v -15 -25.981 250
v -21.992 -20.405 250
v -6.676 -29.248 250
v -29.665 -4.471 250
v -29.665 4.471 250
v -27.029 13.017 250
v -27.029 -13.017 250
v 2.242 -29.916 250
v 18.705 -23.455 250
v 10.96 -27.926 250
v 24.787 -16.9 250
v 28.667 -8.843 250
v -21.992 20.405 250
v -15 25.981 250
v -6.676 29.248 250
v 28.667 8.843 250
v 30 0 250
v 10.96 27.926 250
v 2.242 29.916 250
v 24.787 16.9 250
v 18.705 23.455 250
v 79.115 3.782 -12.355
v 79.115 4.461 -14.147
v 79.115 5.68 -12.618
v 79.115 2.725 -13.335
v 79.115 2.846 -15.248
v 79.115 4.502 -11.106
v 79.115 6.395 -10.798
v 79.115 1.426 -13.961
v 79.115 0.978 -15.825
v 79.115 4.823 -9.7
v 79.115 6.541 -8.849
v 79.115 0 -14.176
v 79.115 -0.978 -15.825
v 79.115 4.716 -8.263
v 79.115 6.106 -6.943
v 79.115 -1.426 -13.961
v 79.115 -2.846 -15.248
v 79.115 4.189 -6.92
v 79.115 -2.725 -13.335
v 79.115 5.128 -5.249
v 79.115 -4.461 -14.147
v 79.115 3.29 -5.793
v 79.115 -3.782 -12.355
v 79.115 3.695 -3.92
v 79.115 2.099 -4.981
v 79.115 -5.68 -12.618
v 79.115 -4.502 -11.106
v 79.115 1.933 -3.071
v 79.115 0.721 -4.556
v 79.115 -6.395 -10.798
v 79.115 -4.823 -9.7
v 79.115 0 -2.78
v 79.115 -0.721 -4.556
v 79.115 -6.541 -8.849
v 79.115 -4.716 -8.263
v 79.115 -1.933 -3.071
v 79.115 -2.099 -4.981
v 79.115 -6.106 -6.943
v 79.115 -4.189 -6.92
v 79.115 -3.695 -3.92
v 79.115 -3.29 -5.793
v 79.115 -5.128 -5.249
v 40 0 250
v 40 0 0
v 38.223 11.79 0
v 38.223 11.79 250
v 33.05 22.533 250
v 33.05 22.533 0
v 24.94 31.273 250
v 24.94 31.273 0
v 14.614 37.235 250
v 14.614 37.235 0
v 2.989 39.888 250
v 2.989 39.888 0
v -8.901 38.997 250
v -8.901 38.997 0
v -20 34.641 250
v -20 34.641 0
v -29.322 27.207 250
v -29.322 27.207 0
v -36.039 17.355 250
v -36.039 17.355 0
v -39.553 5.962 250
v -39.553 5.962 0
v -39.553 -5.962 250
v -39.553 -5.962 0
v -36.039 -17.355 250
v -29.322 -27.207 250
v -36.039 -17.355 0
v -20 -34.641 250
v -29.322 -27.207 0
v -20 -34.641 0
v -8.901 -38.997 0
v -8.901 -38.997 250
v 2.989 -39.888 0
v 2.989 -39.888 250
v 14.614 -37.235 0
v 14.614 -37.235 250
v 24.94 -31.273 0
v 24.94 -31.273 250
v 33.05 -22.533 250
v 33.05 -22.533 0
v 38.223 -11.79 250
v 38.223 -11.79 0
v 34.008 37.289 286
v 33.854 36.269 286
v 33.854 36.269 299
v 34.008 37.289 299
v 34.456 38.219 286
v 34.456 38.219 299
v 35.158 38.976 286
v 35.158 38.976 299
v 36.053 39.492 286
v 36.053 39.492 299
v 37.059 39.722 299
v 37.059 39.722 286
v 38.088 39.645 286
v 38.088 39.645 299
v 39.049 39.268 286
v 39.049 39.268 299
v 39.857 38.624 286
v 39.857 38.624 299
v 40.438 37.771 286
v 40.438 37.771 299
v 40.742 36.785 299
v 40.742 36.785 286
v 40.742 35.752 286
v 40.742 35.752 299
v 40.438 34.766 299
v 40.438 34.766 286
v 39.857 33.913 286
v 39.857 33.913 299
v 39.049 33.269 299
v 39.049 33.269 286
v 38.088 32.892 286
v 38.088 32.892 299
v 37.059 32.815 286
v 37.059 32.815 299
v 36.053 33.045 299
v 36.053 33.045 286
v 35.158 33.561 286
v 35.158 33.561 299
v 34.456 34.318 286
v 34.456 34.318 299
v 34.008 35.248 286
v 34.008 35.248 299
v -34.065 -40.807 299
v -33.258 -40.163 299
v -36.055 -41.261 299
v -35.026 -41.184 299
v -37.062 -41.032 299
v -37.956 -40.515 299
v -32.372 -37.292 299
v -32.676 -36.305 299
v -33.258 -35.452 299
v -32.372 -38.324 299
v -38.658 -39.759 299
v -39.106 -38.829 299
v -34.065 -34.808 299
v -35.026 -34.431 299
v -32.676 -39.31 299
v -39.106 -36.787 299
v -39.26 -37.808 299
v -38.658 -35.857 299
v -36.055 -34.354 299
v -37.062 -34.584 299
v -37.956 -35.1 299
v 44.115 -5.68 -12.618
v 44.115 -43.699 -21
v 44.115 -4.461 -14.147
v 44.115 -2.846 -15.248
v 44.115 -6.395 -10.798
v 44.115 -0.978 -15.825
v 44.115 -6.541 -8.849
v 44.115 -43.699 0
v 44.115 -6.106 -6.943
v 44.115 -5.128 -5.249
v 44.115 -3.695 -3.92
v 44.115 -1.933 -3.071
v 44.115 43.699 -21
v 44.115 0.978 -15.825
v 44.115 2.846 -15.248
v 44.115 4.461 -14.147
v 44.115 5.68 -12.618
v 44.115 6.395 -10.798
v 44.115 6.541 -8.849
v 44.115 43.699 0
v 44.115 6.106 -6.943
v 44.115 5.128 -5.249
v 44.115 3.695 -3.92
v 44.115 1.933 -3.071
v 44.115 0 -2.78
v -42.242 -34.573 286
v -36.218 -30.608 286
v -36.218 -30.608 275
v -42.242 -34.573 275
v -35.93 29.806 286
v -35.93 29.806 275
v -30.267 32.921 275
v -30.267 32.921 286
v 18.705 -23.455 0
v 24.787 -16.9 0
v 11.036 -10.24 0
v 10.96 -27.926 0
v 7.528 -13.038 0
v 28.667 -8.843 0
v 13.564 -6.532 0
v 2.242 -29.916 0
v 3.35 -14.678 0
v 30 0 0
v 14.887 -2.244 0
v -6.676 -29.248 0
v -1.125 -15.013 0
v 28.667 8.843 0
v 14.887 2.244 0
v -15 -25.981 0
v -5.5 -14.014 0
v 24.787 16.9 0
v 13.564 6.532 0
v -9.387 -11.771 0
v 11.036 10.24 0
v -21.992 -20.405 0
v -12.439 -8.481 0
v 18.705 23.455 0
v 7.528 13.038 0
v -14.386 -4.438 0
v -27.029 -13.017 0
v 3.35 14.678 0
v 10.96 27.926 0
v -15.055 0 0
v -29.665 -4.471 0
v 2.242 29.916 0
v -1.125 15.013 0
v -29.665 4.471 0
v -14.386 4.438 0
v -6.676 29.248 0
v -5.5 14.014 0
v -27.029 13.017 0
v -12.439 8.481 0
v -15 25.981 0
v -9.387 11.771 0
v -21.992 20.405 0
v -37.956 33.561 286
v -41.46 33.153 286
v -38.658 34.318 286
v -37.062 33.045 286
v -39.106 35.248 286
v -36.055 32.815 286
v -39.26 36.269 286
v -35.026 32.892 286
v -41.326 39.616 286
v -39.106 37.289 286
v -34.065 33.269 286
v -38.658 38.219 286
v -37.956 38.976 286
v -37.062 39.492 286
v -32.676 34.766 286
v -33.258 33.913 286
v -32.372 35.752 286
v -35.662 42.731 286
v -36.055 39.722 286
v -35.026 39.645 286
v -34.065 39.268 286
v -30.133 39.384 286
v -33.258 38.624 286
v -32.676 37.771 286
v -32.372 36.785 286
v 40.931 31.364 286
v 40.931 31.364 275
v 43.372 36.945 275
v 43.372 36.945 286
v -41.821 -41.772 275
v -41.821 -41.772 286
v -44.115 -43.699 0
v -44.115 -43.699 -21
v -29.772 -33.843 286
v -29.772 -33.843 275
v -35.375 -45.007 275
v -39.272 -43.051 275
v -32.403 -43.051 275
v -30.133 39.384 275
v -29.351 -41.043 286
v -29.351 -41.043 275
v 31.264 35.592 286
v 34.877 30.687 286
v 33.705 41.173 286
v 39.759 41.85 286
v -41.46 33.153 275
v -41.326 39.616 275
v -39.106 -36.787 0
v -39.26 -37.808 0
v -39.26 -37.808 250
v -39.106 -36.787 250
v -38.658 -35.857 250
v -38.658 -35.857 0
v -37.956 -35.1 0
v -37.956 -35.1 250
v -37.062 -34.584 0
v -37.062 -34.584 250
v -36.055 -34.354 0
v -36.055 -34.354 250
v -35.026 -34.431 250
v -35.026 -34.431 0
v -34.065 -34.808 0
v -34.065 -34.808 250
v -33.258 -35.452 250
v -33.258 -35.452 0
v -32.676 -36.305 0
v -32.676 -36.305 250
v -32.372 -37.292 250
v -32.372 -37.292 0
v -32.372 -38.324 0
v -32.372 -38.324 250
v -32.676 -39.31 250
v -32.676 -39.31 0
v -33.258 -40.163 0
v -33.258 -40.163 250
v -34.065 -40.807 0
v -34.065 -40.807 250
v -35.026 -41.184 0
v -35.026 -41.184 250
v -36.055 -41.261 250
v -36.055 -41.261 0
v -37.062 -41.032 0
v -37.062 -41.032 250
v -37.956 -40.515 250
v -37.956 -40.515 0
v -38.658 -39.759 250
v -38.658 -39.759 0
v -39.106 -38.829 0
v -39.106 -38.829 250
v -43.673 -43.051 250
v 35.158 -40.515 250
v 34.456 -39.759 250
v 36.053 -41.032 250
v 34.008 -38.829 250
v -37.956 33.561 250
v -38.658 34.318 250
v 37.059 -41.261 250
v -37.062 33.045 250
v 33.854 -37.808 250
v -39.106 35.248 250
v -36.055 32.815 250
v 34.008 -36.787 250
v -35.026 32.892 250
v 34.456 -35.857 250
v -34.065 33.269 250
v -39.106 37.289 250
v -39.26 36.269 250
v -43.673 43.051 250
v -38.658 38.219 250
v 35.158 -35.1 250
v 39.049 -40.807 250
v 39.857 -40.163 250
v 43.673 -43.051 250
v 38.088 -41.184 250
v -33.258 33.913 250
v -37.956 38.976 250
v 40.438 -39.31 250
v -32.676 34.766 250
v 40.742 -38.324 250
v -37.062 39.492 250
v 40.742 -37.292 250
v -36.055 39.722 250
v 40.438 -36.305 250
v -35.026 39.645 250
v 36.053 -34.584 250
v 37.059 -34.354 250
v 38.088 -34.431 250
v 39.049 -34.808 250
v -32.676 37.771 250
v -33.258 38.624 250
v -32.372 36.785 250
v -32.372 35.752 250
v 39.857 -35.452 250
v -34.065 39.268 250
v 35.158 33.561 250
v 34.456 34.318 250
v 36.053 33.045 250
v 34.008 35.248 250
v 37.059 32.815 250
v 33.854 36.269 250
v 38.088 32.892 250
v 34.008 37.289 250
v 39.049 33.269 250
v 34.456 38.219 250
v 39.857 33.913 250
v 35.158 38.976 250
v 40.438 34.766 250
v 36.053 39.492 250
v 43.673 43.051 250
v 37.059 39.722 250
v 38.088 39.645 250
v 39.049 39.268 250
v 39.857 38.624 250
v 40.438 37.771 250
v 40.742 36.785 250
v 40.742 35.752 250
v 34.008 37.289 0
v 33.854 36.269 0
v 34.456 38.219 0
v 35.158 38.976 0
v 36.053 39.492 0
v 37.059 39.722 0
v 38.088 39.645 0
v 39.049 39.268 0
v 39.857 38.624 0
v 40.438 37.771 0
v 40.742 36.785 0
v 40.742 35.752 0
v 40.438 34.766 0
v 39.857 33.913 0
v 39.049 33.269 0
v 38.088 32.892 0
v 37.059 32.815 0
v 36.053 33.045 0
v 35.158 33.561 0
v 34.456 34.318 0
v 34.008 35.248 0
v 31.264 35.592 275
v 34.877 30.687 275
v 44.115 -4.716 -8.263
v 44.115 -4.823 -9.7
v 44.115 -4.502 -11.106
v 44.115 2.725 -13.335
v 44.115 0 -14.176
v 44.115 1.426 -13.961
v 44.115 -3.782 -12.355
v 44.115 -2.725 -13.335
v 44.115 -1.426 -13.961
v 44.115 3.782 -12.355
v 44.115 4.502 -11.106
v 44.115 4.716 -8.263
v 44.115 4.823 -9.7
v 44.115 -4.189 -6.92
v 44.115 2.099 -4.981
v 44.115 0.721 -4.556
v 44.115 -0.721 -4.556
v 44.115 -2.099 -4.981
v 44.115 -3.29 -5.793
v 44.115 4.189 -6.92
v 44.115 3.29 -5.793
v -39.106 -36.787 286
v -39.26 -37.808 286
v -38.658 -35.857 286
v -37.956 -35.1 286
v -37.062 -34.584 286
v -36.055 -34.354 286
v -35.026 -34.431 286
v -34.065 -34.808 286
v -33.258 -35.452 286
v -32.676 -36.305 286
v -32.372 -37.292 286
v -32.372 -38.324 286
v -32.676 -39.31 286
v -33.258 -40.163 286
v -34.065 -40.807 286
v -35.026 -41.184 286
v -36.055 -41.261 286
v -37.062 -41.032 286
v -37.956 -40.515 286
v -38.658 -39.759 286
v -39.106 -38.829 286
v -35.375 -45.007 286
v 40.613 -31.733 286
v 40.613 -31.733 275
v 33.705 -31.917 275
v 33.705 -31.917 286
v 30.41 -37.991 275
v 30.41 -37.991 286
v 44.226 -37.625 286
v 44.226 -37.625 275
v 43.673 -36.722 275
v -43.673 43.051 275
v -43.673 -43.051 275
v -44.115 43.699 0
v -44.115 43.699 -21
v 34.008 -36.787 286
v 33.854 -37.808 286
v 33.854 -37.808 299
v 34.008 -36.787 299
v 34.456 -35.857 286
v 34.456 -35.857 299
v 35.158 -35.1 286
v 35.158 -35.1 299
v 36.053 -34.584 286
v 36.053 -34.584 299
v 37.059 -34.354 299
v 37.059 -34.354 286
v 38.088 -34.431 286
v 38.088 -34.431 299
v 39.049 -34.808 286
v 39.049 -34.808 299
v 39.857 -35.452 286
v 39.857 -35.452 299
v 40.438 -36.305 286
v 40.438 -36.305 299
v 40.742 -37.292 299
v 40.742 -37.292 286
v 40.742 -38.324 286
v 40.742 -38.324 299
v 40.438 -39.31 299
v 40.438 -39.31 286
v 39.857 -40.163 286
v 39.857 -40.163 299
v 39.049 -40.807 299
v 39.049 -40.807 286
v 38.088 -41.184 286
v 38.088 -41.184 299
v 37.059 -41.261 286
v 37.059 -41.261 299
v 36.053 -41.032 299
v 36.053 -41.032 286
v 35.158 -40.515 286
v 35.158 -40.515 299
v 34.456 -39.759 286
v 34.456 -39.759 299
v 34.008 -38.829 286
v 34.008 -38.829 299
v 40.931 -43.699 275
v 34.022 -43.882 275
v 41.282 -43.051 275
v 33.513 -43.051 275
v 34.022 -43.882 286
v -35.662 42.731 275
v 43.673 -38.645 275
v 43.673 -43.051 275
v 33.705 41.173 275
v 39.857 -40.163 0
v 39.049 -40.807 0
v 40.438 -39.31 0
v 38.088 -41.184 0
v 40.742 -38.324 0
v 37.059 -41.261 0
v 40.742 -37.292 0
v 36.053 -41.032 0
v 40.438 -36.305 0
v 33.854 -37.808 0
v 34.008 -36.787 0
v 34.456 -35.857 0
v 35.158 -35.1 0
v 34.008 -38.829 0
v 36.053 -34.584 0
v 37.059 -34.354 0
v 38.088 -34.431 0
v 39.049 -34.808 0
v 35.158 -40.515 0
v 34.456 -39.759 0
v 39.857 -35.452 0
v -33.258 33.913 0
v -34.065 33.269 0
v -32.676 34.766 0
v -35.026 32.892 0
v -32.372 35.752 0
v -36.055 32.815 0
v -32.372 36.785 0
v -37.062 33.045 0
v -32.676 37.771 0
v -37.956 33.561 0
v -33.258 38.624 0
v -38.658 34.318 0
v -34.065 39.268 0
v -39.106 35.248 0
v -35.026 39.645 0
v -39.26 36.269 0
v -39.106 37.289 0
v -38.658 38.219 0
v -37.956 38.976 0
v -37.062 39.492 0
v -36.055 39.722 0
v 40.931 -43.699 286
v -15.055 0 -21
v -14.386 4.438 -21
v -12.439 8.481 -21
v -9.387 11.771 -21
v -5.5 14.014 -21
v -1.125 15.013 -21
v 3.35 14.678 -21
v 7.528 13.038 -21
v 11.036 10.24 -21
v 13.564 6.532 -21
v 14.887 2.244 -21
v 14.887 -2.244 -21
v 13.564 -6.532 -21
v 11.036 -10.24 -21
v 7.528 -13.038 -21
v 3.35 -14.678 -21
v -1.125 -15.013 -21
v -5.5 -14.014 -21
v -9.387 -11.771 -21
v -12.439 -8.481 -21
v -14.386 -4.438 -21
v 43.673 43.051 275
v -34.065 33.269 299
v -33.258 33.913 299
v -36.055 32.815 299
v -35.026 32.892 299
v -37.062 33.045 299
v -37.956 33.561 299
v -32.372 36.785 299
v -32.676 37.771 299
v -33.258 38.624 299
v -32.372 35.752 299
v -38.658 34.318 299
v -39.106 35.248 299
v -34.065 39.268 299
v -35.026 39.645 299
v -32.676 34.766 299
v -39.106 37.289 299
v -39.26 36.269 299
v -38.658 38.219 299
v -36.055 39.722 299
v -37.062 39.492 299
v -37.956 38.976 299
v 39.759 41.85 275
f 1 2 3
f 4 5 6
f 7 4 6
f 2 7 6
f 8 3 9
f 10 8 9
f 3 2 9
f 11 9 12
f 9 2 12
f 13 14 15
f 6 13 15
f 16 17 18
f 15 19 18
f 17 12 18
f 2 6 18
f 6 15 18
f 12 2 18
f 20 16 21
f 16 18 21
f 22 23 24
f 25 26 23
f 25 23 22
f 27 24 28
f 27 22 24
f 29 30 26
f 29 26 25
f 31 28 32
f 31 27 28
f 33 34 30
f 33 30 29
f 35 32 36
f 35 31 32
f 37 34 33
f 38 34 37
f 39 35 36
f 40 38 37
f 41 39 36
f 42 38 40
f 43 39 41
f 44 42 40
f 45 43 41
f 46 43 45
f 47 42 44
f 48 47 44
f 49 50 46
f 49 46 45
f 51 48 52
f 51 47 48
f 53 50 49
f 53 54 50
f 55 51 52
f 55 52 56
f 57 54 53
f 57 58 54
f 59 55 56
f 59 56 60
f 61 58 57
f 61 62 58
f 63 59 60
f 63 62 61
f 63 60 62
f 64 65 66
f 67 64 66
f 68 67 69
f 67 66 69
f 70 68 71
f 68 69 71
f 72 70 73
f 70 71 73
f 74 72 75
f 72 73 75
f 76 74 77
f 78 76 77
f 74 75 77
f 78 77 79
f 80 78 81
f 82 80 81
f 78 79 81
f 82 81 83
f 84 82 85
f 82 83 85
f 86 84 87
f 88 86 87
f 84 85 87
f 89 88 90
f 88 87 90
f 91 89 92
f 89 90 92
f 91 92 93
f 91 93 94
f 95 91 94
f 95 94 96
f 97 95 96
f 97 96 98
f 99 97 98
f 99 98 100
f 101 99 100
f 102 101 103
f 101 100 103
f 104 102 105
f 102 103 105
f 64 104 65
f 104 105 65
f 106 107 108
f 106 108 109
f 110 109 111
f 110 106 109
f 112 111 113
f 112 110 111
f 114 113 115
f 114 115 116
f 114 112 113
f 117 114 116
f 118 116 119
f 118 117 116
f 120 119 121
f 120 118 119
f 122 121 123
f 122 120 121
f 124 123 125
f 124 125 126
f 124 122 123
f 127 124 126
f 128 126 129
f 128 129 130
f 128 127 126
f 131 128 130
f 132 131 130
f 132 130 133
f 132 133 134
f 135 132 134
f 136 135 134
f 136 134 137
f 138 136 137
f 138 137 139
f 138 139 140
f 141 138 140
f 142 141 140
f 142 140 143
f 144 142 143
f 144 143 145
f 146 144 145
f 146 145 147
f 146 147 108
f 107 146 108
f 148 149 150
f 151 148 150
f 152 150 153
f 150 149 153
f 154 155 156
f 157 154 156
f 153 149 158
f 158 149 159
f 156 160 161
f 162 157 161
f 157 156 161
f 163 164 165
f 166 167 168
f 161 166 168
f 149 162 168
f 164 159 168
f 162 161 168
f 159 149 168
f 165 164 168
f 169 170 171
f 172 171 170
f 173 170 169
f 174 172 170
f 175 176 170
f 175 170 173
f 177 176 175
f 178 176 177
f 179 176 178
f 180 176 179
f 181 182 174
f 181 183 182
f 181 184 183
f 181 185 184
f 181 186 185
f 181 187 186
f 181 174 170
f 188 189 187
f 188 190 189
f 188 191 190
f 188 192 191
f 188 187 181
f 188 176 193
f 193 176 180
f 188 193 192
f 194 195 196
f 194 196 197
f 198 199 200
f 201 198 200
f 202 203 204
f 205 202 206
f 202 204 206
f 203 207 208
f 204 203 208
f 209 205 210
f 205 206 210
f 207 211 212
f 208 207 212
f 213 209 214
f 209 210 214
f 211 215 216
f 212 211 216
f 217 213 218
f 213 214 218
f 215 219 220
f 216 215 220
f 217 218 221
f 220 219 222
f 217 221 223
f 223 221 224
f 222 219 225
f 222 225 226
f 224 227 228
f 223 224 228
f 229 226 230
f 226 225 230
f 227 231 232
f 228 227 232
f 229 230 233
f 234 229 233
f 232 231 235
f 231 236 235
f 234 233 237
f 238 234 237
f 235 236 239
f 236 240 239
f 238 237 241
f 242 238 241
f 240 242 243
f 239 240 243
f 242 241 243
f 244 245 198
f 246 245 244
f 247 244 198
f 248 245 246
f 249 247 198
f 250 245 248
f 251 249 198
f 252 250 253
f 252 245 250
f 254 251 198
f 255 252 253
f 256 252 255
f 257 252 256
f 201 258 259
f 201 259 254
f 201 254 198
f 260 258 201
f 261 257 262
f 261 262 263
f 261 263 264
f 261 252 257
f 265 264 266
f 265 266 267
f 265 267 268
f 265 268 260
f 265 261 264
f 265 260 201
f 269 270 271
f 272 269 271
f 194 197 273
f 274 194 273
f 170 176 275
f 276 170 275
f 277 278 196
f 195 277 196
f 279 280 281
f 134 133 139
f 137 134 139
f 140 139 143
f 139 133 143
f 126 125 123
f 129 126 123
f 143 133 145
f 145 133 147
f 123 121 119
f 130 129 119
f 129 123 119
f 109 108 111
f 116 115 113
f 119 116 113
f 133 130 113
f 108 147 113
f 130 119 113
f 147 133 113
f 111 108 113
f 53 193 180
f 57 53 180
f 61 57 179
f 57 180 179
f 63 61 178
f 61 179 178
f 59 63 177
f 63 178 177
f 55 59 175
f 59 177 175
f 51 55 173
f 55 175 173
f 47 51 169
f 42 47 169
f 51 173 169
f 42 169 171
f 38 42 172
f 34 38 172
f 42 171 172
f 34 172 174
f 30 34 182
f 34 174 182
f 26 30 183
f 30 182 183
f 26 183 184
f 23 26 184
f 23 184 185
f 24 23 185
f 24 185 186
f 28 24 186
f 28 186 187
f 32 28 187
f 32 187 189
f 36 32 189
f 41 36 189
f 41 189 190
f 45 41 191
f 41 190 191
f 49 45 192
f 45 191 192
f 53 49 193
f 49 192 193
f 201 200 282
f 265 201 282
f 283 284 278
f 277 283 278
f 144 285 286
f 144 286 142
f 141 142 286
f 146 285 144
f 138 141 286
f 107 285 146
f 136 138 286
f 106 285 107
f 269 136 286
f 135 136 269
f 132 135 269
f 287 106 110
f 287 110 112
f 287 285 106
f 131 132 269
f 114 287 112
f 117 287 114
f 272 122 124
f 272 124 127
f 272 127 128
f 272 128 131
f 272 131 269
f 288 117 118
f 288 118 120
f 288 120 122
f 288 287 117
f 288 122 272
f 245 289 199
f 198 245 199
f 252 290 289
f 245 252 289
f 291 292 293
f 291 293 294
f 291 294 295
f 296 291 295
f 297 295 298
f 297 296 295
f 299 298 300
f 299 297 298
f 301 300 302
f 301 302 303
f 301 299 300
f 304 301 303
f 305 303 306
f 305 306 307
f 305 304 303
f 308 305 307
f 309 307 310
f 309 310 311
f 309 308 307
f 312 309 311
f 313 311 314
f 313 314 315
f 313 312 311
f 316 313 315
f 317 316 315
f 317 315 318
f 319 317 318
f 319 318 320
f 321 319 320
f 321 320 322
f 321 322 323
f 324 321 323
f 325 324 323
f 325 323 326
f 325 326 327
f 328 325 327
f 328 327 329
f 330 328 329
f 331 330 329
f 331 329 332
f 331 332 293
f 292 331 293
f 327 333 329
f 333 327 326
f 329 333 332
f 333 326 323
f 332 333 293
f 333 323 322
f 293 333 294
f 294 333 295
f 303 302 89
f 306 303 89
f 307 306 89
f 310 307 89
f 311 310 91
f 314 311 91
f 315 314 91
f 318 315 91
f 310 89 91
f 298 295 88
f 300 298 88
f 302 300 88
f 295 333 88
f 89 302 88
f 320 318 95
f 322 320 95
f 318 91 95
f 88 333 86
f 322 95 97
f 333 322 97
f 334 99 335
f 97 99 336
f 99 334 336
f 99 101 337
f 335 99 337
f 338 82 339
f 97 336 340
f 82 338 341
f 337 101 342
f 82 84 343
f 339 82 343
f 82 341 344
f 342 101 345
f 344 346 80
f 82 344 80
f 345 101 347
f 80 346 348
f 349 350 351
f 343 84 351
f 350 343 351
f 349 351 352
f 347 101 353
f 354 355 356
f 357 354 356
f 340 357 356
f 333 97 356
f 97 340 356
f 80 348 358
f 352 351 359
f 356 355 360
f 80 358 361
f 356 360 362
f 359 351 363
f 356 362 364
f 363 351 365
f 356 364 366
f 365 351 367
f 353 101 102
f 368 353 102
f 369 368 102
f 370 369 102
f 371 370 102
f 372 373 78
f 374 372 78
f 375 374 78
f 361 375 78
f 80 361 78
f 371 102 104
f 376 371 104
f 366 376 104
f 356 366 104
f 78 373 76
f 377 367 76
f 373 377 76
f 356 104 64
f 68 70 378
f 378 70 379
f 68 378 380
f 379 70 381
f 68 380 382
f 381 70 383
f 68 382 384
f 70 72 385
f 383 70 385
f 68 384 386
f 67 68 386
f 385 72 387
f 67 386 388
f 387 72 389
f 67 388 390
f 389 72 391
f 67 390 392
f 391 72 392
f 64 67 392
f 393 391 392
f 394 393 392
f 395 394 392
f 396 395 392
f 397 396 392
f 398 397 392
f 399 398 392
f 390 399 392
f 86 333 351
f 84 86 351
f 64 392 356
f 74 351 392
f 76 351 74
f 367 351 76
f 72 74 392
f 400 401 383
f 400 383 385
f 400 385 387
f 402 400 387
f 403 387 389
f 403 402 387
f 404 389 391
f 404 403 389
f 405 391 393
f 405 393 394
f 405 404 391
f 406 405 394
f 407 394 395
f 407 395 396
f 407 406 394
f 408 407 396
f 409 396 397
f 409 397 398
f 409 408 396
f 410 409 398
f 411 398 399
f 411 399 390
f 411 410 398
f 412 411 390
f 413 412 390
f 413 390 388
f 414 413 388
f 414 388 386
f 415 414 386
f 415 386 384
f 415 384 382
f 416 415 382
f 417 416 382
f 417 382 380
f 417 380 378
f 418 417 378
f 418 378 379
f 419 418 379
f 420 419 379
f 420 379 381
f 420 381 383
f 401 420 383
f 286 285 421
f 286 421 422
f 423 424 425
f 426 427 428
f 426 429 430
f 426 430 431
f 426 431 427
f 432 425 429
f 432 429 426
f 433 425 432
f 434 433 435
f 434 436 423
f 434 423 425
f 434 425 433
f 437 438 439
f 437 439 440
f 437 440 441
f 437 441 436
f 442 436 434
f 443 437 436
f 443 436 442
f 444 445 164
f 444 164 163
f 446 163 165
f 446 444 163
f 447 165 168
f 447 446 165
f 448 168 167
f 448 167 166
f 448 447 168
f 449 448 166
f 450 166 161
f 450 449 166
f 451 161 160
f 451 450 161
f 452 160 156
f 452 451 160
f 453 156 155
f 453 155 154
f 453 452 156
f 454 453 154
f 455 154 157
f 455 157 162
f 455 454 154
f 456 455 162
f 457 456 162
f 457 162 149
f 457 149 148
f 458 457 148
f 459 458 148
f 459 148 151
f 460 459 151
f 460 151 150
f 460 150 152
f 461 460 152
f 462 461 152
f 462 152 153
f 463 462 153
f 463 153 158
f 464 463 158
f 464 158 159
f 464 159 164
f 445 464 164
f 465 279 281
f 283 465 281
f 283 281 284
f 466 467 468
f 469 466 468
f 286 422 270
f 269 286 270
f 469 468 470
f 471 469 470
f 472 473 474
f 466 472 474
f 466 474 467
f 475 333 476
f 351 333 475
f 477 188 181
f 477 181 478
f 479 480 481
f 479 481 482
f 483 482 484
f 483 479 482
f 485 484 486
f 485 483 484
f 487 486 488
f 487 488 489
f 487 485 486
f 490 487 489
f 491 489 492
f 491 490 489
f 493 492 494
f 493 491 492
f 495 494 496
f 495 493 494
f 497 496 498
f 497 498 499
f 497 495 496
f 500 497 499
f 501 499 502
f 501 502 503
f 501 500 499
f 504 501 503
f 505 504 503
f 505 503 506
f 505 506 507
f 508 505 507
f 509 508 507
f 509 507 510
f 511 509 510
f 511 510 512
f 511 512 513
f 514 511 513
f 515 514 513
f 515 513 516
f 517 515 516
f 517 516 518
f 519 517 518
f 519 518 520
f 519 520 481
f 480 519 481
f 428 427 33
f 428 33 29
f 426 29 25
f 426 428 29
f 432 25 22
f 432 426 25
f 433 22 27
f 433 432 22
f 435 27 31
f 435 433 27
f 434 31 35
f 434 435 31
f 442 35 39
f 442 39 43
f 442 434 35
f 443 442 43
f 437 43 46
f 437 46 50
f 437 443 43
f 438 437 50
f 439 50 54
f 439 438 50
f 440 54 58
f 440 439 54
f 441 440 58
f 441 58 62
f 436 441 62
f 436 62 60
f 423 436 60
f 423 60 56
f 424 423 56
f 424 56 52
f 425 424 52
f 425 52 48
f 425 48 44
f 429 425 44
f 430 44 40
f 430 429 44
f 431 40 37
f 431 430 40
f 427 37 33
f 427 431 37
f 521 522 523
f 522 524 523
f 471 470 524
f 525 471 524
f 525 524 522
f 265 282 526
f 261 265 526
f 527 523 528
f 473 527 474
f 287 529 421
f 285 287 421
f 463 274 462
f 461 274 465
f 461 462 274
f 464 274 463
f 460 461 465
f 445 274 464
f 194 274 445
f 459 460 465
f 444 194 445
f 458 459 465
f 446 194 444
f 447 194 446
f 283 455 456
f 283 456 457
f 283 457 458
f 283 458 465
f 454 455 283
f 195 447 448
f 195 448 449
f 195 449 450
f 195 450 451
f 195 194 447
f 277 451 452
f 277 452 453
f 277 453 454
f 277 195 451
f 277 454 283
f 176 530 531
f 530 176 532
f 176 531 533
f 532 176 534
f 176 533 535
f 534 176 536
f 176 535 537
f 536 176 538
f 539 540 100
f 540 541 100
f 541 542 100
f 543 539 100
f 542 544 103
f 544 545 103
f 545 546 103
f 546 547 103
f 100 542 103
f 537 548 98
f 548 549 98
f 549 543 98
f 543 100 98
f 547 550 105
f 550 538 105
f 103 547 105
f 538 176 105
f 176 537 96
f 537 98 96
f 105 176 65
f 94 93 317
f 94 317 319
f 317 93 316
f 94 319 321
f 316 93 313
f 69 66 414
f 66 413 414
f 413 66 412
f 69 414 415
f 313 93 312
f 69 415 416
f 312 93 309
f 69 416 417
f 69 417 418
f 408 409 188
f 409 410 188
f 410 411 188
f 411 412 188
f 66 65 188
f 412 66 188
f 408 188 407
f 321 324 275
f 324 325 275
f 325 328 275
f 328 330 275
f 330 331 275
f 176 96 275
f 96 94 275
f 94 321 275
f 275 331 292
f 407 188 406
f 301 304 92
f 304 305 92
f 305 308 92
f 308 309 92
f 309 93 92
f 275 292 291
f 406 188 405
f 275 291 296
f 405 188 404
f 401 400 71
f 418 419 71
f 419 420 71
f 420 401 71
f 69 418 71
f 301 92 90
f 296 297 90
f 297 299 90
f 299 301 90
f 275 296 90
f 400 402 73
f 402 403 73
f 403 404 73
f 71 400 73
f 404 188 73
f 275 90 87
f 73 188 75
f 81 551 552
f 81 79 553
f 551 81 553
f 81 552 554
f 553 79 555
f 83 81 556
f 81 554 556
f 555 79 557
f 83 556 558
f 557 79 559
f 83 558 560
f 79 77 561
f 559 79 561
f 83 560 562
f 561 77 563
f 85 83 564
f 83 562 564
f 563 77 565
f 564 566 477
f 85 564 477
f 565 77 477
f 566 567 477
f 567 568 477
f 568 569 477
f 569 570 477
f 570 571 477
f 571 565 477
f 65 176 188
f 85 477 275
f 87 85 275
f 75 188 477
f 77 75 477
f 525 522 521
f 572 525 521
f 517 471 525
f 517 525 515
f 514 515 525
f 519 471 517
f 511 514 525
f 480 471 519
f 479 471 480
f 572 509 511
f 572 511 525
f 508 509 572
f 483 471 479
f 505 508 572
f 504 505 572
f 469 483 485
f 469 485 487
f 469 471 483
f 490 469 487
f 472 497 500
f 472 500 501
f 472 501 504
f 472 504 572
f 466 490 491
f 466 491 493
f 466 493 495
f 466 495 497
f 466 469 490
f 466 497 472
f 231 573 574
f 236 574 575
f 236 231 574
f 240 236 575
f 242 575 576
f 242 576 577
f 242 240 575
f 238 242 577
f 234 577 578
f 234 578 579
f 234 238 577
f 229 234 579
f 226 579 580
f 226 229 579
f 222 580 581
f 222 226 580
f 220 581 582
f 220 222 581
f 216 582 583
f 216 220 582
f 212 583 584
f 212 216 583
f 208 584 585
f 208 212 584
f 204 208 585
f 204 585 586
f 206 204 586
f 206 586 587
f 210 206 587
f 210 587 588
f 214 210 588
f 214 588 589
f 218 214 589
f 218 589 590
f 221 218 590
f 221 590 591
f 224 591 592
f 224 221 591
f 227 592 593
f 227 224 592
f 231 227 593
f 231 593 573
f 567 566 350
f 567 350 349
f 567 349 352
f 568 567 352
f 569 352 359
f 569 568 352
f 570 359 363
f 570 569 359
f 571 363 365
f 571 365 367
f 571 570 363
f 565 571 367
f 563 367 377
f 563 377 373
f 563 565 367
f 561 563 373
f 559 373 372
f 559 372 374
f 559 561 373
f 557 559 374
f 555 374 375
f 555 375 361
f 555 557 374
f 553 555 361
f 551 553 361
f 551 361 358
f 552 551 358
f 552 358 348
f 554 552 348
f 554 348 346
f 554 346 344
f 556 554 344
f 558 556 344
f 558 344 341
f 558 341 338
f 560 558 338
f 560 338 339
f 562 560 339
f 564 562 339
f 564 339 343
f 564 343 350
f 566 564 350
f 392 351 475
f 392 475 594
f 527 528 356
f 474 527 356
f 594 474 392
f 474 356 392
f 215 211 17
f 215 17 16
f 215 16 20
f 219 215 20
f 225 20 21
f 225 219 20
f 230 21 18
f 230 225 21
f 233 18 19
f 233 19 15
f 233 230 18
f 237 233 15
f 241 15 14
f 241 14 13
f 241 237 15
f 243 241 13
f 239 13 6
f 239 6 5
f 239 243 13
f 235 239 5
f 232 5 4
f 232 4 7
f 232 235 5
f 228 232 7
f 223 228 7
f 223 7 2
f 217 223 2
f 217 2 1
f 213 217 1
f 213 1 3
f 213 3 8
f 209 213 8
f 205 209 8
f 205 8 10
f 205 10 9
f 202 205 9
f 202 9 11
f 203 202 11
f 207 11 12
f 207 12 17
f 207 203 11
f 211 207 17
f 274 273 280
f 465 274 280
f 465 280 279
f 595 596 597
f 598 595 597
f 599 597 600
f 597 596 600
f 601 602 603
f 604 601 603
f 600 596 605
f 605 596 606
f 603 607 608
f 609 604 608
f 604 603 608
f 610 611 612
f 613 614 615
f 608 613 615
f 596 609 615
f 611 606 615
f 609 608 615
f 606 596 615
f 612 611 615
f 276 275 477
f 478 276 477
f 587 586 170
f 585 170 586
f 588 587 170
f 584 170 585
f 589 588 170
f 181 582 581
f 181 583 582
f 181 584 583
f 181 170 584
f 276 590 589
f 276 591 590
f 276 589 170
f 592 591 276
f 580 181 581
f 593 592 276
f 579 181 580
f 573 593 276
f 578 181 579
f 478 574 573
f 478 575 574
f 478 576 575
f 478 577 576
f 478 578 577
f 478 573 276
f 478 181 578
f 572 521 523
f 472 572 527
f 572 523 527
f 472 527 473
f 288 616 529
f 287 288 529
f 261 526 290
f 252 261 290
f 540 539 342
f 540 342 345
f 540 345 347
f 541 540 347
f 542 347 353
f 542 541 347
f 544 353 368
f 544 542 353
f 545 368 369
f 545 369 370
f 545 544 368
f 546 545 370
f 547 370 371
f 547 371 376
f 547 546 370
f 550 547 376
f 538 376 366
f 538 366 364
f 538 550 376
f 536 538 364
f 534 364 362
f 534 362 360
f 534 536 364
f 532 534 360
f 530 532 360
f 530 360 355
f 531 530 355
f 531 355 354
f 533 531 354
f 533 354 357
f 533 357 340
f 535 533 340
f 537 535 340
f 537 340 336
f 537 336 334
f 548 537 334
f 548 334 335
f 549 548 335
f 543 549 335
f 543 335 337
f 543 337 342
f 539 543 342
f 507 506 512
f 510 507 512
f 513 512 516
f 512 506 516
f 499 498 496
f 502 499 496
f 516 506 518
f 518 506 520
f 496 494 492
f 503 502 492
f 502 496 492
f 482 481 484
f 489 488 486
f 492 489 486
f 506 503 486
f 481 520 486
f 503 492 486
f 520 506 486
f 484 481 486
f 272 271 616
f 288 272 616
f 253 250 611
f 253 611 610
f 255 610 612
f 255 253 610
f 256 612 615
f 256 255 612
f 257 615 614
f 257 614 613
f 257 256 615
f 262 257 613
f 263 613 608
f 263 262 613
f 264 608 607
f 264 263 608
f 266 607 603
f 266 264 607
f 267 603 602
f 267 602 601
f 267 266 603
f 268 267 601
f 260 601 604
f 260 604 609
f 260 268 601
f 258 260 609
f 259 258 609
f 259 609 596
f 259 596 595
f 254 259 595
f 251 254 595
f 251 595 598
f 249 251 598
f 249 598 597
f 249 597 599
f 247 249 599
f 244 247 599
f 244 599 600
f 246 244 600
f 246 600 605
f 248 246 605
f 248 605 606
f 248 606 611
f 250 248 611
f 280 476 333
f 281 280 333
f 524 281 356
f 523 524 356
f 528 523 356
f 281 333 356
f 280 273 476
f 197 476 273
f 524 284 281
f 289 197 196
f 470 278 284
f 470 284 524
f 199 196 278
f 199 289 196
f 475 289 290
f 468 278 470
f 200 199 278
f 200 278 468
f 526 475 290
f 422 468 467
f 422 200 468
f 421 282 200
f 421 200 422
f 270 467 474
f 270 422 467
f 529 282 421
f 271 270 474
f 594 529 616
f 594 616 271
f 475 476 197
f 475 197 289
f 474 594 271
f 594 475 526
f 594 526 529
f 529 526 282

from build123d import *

# Parameters (mm, degrees)
SKETCH1_R           = 40
SKETCH1_R_2         = 30
BOSS_EXTRUDE1_DEPTH = 250
SKETCH2_W           = 87.3454085
SKETCH2_H           = 86.102689272
BOSS_EXTRUDE2_DEPTH = 25
SKETCH3_W           = 88.230119684
SKETCH3_H           = 87.397760064
SKETCH3_R           = 15.055192133
BOSS_EXTRUDE3_DEPTH = 21
SKETCH4_R           = 6.558948387
SKETCH4_R_2         = 4.836777433
BOSS_EXTRUDE4_DEPTH = 35
SKETCH5_R           = 3.463305275
BOSS_EXTRUDE5_DEPTH = 320
BOSS_EXTRUDE6_DEPTH = 11


with BuildPart() as part:
    # Sketch1 → Boss-Extrude1 (new body)
    with BuildSketch(Plane.XY):
        Circle(SKETCH1_R)
        Circle(SKETCH1_R_2, mode=Mode.SUBTRACT)
    extrude(amount=BOSS_EXTRUDE1_DEPTH)

    # Sketch2 → Boss-Extrude2 (add)
    with BuildSketch(Plane.XY.offset(250)):
        Rectangle(SKETCH2_W, SKETCH2_H)
    extrude(amount=BOSS_EXTRUDE2_DEPTH)

    # Sketch3 → Boss-Extrude3 (add)
    with BuildSketch(Plane(origin=(0, 0, 0), x_dir=(-1, 0, 0), z_dir=(0, 0, -1))):
        Rectangle(SKETCH3_W, SKETCH3_H)
        Circle(SKETCH3_R, mode=Mode.SUBTRACT)
    extrude(amount=BOSS_EXTRUDE3_DEPTH)

    # Sketch4 → Boss-Extrude4 (add)
    with BuildSketch(Plane(origin=(44.115059842, 0, 0), x_dir=(0, 0, -1), z_dir=(1, 0, 0))):
        with Locations(Location((9.33886413, 0, 0), (0, 0, 180))):
            Circle(SKETCH4_R)
        with Locations((9.33886413, 0)):
            Circle(SKETCH4_R_2, mode=Mode.SUBTRACT)
    extrude(amount=BOSS_EXTRUDE4_DEPTH)

    # Sketch5 → Boss-Extrude5 (add)
    with BuildSketch(Plane(origin=(0, 0, -21), x_dir=(-1, 0, 0), z_dir=(0, 0, -1))):
        with Locations((-37.317802409, 36.268502466)):
            Circle(SKETCH5_R)
        with Locations((35.79642007, 36.268502466)):
            Circle(SKETCH5_R)
        with Locations((35.79642007, -37.807749255)):
            Circle(SKETCH5_R)
        with Locations((-37.317802409, -37.807749255)):
            Circle(SKETCH5_R)
    extrude(amount=-BOSS_EXTRUDE5_DEPTH)

    # Sketch6 → Boss-Extrude6 (add)
    with BuildSketch(Plane.XY.offset(275)):
        Polygon((-30.267074755, 32.921442439), (-30.1331084, 39.383525962), (-35.662453716, 42.73058599), (-41.325765385, 39.615562494), (-41.45973174, 33.153478971), (-35.930386425, 29.806418943), align=None)
        Polygon((40.930579927, 31.363930691), (43.37167492, 36.944973688), (39.758897402, 41.849545463), (33.70502489, 41.173074242), (31.263929897, 35.592031245), (34.876707416, 30.68745947), align=None)
        Polygon((-29.350890947, -41.042634272), (-29.772162906, -33.843199803), (-36.217692029, -30.608314786), (-42.241949193, -34.572864239), (-41.820677234, -41.772298708), (-35.375148111, -45.007183725), align=None)
        Polygon((40.930579927, -43.698880032), (44.226060077, -37.624557535), (40.613282559, -31.733426758), (33.70502489, -31.916618479), (30.40954474, -37.990940976), (34.022322258, -43.882071753), align=None)
    extrude(amount=BOSS_EXTRUDE6_DEPTH)


solid = part.part
